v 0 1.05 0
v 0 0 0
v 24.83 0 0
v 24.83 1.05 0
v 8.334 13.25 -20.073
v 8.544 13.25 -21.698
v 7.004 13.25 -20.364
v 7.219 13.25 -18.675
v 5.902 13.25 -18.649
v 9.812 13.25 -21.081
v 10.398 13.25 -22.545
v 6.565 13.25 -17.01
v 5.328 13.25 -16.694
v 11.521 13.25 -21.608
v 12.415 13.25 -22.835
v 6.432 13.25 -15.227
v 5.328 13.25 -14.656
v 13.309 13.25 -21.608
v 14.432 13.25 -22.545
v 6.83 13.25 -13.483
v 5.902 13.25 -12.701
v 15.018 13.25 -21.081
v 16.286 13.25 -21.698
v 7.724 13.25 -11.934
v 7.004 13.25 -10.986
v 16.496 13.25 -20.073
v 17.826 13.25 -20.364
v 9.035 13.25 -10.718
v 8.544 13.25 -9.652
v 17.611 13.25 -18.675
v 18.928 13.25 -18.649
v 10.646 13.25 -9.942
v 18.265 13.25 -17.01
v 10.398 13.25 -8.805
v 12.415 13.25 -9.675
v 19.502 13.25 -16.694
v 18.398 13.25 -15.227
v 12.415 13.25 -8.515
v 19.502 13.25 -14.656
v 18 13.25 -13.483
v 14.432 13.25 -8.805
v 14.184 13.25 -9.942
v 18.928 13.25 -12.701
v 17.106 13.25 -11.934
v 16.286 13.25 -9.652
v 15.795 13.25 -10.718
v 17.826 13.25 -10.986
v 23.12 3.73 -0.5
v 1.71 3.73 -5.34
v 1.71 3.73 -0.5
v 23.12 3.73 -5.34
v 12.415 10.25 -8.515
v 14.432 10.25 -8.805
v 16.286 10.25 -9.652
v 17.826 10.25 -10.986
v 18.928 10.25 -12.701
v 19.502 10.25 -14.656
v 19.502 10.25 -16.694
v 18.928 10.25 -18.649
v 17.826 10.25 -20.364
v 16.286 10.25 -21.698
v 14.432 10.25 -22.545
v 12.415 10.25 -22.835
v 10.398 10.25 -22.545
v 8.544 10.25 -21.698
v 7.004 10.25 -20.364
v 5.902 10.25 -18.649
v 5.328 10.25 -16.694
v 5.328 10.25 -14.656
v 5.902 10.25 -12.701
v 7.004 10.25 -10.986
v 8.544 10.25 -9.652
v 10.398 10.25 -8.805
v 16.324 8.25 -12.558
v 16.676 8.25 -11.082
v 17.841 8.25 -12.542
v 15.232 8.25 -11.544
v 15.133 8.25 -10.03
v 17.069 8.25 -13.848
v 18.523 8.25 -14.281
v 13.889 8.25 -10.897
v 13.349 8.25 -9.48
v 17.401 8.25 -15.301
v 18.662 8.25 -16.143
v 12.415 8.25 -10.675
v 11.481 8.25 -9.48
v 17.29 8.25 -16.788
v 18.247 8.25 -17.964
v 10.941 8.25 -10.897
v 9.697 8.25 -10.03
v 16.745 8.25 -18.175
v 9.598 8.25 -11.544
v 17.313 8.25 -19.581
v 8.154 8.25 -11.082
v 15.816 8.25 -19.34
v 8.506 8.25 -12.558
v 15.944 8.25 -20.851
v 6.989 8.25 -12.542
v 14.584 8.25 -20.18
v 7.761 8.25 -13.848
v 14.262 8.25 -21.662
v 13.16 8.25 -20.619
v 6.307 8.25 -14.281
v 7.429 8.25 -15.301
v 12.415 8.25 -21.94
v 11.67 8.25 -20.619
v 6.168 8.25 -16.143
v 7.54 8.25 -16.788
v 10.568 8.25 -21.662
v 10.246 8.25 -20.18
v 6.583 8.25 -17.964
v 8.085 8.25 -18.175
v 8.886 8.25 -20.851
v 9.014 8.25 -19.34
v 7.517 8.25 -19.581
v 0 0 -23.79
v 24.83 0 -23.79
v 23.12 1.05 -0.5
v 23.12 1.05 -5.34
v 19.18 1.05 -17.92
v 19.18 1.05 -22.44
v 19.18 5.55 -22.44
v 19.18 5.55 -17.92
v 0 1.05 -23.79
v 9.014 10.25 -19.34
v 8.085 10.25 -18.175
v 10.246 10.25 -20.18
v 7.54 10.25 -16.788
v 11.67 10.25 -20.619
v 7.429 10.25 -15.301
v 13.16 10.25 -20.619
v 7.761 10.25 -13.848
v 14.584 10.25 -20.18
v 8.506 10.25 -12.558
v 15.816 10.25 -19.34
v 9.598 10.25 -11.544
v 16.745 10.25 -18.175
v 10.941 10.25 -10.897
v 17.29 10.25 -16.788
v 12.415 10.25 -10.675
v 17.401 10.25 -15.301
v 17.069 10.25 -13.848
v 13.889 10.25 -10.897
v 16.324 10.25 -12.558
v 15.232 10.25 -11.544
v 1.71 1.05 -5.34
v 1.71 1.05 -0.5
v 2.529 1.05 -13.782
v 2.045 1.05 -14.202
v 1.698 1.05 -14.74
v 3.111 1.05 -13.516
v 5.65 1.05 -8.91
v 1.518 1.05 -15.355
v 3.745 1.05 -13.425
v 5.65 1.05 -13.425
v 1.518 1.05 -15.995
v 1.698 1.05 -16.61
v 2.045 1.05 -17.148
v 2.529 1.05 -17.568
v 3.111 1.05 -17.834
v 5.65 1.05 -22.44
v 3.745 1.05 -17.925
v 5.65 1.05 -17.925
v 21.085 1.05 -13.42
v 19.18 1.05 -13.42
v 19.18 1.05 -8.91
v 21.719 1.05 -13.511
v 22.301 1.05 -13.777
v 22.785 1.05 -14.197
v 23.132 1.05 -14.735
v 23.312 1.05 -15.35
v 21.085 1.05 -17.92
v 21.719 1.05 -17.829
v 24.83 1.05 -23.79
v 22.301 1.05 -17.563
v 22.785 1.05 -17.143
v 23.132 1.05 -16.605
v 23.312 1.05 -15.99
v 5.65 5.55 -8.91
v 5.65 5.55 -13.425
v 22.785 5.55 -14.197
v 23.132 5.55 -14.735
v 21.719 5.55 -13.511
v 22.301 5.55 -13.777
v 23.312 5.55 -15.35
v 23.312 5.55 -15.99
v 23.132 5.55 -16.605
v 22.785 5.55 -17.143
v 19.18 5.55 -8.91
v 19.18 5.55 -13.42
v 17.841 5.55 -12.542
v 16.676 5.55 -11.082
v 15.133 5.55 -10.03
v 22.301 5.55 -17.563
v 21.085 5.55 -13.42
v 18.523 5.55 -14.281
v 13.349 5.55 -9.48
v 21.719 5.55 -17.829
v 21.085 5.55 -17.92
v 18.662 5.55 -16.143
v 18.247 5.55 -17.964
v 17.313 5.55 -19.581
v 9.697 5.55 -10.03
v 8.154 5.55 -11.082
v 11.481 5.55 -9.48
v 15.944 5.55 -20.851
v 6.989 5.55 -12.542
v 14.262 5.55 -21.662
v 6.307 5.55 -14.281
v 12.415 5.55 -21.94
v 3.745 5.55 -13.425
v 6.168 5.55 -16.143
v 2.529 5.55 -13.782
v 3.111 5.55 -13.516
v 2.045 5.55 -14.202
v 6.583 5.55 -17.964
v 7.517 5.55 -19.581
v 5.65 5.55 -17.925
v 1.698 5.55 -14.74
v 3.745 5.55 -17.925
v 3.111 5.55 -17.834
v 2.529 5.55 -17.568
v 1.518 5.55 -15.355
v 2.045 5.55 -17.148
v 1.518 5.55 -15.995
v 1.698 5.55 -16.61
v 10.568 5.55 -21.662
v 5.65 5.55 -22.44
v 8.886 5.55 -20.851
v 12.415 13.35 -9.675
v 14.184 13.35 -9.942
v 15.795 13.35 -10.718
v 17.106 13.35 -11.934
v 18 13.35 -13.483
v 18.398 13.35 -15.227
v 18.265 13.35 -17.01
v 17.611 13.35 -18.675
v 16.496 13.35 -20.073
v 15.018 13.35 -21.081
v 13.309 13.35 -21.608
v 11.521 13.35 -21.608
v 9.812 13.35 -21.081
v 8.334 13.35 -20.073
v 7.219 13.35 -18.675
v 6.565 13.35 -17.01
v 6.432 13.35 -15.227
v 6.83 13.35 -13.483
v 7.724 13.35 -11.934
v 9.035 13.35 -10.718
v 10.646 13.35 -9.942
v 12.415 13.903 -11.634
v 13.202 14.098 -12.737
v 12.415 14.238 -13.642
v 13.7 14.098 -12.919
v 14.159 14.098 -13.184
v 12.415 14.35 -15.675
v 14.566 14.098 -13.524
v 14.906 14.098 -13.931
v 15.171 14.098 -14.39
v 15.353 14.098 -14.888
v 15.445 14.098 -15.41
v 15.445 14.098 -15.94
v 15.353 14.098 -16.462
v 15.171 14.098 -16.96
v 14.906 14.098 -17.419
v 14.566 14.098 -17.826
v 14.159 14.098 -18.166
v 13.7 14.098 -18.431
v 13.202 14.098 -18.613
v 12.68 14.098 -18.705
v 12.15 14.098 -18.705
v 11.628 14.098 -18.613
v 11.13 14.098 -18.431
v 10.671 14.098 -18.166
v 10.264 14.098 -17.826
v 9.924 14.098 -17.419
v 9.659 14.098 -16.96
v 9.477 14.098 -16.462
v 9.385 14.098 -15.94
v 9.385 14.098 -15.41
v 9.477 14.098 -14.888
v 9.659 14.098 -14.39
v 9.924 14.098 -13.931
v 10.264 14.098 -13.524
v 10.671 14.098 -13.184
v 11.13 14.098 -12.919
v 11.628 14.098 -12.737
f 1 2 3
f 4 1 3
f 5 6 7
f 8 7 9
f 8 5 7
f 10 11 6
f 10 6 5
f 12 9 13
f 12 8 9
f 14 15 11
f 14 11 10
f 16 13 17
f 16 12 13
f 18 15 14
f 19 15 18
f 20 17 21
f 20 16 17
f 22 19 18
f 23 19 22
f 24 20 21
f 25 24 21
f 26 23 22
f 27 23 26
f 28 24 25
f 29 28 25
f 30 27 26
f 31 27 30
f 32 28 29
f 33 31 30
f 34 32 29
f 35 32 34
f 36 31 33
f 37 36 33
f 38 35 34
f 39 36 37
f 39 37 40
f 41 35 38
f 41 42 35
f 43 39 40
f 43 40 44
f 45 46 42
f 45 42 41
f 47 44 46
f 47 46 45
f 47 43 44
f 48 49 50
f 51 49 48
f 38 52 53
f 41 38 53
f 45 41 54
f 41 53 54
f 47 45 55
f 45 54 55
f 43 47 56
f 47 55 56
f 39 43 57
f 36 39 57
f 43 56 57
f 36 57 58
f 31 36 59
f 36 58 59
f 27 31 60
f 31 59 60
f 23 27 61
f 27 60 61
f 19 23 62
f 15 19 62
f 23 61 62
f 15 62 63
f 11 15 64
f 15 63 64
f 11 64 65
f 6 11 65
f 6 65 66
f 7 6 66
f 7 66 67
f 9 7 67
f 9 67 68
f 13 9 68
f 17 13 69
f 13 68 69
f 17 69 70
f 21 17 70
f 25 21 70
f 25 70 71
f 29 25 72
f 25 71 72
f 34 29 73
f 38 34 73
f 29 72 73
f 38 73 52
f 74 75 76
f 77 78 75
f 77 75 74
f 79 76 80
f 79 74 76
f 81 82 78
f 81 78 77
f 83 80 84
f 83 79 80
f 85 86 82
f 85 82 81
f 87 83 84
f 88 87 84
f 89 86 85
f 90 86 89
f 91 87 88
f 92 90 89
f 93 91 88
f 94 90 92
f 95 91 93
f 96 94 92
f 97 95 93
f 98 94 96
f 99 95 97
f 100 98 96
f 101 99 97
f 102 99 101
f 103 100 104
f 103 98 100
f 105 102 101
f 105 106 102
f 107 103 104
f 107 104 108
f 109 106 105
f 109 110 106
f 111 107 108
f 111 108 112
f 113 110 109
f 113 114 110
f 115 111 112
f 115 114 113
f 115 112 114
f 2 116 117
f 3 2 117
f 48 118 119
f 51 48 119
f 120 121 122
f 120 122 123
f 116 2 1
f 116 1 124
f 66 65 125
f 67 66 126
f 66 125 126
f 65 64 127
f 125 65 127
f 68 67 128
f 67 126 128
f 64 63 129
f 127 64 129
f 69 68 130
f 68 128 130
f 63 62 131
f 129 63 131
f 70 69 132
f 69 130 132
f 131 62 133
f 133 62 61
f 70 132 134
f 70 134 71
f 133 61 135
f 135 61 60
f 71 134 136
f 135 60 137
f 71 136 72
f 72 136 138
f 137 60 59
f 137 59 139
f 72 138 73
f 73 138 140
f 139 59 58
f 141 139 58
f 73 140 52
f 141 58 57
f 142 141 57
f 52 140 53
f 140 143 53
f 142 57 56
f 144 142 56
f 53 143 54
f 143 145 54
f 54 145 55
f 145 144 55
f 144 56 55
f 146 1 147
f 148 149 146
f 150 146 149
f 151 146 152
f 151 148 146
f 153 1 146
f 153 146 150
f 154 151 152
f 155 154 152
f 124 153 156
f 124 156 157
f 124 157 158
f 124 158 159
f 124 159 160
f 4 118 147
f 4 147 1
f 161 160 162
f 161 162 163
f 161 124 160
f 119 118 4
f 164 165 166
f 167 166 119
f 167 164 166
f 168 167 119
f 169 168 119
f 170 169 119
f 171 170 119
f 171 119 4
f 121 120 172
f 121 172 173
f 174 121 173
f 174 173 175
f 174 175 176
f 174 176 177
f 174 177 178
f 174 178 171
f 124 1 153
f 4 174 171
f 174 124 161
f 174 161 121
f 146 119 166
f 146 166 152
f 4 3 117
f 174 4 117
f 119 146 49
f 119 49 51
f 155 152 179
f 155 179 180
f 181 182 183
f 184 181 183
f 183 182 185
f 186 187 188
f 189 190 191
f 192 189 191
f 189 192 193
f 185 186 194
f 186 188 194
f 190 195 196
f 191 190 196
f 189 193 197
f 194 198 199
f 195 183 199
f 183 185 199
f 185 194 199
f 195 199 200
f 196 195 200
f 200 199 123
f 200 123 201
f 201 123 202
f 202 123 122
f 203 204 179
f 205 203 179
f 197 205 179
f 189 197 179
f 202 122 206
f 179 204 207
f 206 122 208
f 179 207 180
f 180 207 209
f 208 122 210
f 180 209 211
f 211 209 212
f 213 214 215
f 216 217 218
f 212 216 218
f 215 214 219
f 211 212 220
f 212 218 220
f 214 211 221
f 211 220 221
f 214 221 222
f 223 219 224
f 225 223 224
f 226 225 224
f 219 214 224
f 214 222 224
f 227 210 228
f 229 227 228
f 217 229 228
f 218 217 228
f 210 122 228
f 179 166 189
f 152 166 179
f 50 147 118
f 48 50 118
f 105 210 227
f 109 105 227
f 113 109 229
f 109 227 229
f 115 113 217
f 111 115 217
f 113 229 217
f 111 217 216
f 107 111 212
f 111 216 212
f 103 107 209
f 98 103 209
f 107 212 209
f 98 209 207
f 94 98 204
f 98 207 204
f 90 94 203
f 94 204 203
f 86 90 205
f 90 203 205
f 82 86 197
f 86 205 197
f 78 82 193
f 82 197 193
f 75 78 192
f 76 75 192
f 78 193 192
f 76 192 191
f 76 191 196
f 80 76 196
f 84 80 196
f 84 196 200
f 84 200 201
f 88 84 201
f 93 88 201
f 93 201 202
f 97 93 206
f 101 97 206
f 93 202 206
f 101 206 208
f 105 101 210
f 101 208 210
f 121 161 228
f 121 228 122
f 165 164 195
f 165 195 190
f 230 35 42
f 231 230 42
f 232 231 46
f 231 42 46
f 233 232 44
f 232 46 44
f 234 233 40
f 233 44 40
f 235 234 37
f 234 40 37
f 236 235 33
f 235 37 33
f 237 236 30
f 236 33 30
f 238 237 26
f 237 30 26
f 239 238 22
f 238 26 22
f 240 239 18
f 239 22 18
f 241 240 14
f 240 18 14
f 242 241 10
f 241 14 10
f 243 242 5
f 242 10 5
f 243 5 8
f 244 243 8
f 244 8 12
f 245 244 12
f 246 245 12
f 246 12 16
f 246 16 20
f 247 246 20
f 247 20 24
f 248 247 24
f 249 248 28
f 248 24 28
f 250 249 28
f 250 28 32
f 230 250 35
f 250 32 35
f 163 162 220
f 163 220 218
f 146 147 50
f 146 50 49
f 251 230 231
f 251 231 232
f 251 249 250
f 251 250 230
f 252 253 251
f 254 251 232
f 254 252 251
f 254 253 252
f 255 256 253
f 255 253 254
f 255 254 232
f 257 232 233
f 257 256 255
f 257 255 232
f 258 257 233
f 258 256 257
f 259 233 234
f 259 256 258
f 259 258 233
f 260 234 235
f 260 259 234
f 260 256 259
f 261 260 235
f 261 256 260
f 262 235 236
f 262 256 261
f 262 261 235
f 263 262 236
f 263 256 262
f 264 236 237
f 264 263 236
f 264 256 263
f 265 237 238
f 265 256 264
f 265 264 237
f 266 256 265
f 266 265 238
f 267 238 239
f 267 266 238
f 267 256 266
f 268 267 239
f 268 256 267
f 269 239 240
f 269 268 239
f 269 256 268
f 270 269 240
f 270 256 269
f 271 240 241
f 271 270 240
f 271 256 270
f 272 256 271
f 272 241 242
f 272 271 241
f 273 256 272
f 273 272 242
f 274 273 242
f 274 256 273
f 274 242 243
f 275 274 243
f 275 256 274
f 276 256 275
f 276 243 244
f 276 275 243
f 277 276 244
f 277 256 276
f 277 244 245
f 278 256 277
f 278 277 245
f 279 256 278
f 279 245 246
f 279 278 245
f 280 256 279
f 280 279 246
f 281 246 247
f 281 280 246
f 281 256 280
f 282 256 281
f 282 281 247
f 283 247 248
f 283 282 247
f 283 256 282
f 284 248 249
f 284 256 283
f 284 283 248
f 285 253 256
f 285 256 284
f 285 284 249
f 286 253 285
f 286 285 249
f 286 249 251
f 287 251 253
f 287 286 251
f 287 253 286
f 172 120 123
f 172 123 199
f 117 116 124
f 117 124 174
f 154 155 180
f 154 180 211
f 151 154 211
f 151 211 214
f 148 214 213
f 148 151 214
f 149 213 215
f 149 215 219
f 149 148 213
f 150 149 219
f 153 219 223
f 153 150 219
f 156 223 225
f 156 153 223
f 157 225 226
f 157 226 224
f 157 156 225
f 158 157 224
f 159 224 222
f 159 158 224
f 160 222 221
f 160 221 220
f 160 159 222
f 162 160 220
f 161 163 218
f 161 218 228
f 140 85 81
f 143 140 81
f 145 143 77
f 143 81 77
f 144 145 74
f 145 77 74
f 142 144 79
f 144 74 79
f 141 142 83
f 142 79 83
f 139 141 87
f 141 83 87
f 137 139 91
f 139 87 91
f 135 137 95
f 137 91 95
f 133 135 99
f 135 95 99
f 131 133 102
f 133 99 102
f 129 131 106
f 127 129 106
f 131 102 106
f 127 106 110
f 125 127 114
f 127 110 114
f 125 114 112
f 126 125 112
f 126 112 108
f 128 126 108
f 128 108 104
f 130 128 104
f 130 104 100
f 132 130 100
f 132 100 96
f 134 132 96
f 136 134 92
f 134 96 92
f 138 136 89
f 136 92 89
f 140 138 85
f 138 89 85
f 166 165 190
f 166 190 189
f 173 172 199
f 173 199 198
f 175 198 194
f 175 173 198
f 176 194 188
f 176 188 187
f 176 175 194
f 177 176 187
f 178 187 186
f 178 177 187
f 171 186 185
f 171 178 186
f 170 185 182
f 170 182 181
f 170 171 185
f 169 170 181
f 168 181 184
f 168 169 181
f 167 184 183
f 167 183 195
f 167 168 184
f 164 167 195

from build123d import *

# Parameters (mm, degrees)
SKETCH1_W           = 24.83
SKETCH1_H           = 23.79
BOSS_EXTRUDE1_DEPTH = 1.05
BOSS_EXTRUDE2_DEPTH = 4.5
SKETCH3_W           = 21.41
SKETCH3_H           = 4.84
BOSS_EXTRUDE3_DEPTH = 2.68
SKETCH4_R           = 6.265
BOSS_EXTRUDE4_DEPTH = 2.7
SKETCH5_R           = 5
BOSS_EXTRUDE5_DEPTH = 2
SKETCH6_R           = 7.16
BOSS_EXTRUDE6_DEPTH = 3
SKETCH7_R           = 6
BOSS_EXTRUDE7_DEPTH = 0.1
DOME2_FACE_RADIUS   = 6
DOME2_HEIGHT        = 1


with BuildPart() as part:
    # Sketch1 → Boss-Extrude1 (new body)
    with BuildSketch(Plane(origin=(0, 0, 0), x_dir=(1, 0, 0), z_dir=(0, 1, 0))):
        with Locations((12.415, 11.895)):
            Rectangle(SKETCH1_W, SKETCH1_H)
    extrude(amount=BOSS_EXTRUDE1_DEPTH)

    # Sketch2 → Boss-Extrude2 (add)
    with BuildSketch(Plane(origin=(0, 1.05, 0), x_dir=(1, 0, 0), z_dir=(0, 1, 0))):
        with BuildLine():
            Line((3.745, 17.925), (5.65, 17.925))
            Line((5.65, 17.925), (5.65, 22.44))
            Line((5.65, 22.44), (19.18, 22.44))
            Line((19.18, 22.44), (19.18, 17.92))
            Line((19.18, 17.92), (21.085, 17.92))
            ThreePointArc((21.085, 17.92), (23.335, 15.67), (21.085, 13.42))
            Line((21.085, 13.42), (19.18, 13.42))
            Line((19.18, 13.42), (19.18, 8.91))
            Line((19.18, 8.91), (5.65, 8.91))
            Line((5.65, 8.91), (5.65, 13.425))
            Line((5.65, 13.425), (3.745, 13.425))
            ThreePointArc((3.745, 13.425), (1.495, 15.675), (3.745, 17.925))
        make_face()
    extrude(amount=BOSS_EXTRUDE2_DEPTH)

    # Sketch3 → Boss-Extrude3 (add)
    with BuildSketch(Plane(origin=(0, 1.05, 0), x_dir=(1, 0, 0), z_dir=(0, 1, 0))):
        with Locations((12.415, 2.92)):
            Rectangle(SKETCH3_W, SKETCH3_H)
    extrude(amount=BOSS_EXTRUDE3_DEPTH)

    # Sketch4 → Boss-Extrude4 (add)
    with BuildSketch(Plane(origin=(0, 5.55, 0), x_dir=(1, 0, 0), z_dir=(0, 1, 0))):
        with Locations(Location((12.415, 15.675, 0), (0, 0, 90))):
            Circle(SKETCH4_R)
    extrude(amount=BOSS_EXTRUDE4_DEPTH)

    # Sketch5 → Boss-Extrude5 (add)
    with BuildSketch(Plane(origin=(0, 8.25, 0), x_dir=(1, 0, 0), z_dir=(0, 1, 0))):
        with Locations(Location((12.415, 15.675, 0), (0, 0, 270))):
            Circle(SKETCH5_R)
    extrude(amount=BOSS_EXTRUDE5_DEPTH)

    # Sketch6 → Boss-Extrude6 (add)
    with BuildSketch(Plane(origin=(0, 10.25, 0), x_dir=(1, 0, 0), z_dir=(0, 1, 0))):
        with Locations(Location((12.415, 15.675, 0), (0, 0, 270))):
            Circle(SKETCH6_R)
    extrude(amount=BOSS_EXTRUDE6_DEPTH)

    # Sketch7 → Boss-Extrude7 (add)
    with BuildSketch(Plane(origin=(0, 13.25, 0), x_dir=(1, 0, 0), z_dir=(0, 1, 0))):
        with Locations(Location((12.415, 15.675, 0), (0, 0, 270))):
            Circle(SKETCH7_R)
    extrude(amount=BOSS_EXTRUDE7_DEPTH)

    # Dome2: a dome of height H over a round flat face of radius A is a cap of a sphere of radius (A * A + H * H) / (2 * H)
    dome2_r = (DOME2_FACE_RADIUS * DOME2_FACE_RADIUS + DOME2_HEIGHT * DOME2_HEIGHT) / (2 * DOME2_HEIGHT)
    dome2_base = Plane((12.415, 13.35, -15.675), z_dir=(0, 1, 0))
    with Locations(dome2_base.offset(DOME2_HEIGHT - dome2_r)):
        dome2_ball = Sphere(dome2_r, mode=Mode.PRIVATE)
    add(split(dome2_ball, bisect_by=dome2_base, keep=Keep.TOP, mode=Mode.PRIVATE))


solid = part.part
